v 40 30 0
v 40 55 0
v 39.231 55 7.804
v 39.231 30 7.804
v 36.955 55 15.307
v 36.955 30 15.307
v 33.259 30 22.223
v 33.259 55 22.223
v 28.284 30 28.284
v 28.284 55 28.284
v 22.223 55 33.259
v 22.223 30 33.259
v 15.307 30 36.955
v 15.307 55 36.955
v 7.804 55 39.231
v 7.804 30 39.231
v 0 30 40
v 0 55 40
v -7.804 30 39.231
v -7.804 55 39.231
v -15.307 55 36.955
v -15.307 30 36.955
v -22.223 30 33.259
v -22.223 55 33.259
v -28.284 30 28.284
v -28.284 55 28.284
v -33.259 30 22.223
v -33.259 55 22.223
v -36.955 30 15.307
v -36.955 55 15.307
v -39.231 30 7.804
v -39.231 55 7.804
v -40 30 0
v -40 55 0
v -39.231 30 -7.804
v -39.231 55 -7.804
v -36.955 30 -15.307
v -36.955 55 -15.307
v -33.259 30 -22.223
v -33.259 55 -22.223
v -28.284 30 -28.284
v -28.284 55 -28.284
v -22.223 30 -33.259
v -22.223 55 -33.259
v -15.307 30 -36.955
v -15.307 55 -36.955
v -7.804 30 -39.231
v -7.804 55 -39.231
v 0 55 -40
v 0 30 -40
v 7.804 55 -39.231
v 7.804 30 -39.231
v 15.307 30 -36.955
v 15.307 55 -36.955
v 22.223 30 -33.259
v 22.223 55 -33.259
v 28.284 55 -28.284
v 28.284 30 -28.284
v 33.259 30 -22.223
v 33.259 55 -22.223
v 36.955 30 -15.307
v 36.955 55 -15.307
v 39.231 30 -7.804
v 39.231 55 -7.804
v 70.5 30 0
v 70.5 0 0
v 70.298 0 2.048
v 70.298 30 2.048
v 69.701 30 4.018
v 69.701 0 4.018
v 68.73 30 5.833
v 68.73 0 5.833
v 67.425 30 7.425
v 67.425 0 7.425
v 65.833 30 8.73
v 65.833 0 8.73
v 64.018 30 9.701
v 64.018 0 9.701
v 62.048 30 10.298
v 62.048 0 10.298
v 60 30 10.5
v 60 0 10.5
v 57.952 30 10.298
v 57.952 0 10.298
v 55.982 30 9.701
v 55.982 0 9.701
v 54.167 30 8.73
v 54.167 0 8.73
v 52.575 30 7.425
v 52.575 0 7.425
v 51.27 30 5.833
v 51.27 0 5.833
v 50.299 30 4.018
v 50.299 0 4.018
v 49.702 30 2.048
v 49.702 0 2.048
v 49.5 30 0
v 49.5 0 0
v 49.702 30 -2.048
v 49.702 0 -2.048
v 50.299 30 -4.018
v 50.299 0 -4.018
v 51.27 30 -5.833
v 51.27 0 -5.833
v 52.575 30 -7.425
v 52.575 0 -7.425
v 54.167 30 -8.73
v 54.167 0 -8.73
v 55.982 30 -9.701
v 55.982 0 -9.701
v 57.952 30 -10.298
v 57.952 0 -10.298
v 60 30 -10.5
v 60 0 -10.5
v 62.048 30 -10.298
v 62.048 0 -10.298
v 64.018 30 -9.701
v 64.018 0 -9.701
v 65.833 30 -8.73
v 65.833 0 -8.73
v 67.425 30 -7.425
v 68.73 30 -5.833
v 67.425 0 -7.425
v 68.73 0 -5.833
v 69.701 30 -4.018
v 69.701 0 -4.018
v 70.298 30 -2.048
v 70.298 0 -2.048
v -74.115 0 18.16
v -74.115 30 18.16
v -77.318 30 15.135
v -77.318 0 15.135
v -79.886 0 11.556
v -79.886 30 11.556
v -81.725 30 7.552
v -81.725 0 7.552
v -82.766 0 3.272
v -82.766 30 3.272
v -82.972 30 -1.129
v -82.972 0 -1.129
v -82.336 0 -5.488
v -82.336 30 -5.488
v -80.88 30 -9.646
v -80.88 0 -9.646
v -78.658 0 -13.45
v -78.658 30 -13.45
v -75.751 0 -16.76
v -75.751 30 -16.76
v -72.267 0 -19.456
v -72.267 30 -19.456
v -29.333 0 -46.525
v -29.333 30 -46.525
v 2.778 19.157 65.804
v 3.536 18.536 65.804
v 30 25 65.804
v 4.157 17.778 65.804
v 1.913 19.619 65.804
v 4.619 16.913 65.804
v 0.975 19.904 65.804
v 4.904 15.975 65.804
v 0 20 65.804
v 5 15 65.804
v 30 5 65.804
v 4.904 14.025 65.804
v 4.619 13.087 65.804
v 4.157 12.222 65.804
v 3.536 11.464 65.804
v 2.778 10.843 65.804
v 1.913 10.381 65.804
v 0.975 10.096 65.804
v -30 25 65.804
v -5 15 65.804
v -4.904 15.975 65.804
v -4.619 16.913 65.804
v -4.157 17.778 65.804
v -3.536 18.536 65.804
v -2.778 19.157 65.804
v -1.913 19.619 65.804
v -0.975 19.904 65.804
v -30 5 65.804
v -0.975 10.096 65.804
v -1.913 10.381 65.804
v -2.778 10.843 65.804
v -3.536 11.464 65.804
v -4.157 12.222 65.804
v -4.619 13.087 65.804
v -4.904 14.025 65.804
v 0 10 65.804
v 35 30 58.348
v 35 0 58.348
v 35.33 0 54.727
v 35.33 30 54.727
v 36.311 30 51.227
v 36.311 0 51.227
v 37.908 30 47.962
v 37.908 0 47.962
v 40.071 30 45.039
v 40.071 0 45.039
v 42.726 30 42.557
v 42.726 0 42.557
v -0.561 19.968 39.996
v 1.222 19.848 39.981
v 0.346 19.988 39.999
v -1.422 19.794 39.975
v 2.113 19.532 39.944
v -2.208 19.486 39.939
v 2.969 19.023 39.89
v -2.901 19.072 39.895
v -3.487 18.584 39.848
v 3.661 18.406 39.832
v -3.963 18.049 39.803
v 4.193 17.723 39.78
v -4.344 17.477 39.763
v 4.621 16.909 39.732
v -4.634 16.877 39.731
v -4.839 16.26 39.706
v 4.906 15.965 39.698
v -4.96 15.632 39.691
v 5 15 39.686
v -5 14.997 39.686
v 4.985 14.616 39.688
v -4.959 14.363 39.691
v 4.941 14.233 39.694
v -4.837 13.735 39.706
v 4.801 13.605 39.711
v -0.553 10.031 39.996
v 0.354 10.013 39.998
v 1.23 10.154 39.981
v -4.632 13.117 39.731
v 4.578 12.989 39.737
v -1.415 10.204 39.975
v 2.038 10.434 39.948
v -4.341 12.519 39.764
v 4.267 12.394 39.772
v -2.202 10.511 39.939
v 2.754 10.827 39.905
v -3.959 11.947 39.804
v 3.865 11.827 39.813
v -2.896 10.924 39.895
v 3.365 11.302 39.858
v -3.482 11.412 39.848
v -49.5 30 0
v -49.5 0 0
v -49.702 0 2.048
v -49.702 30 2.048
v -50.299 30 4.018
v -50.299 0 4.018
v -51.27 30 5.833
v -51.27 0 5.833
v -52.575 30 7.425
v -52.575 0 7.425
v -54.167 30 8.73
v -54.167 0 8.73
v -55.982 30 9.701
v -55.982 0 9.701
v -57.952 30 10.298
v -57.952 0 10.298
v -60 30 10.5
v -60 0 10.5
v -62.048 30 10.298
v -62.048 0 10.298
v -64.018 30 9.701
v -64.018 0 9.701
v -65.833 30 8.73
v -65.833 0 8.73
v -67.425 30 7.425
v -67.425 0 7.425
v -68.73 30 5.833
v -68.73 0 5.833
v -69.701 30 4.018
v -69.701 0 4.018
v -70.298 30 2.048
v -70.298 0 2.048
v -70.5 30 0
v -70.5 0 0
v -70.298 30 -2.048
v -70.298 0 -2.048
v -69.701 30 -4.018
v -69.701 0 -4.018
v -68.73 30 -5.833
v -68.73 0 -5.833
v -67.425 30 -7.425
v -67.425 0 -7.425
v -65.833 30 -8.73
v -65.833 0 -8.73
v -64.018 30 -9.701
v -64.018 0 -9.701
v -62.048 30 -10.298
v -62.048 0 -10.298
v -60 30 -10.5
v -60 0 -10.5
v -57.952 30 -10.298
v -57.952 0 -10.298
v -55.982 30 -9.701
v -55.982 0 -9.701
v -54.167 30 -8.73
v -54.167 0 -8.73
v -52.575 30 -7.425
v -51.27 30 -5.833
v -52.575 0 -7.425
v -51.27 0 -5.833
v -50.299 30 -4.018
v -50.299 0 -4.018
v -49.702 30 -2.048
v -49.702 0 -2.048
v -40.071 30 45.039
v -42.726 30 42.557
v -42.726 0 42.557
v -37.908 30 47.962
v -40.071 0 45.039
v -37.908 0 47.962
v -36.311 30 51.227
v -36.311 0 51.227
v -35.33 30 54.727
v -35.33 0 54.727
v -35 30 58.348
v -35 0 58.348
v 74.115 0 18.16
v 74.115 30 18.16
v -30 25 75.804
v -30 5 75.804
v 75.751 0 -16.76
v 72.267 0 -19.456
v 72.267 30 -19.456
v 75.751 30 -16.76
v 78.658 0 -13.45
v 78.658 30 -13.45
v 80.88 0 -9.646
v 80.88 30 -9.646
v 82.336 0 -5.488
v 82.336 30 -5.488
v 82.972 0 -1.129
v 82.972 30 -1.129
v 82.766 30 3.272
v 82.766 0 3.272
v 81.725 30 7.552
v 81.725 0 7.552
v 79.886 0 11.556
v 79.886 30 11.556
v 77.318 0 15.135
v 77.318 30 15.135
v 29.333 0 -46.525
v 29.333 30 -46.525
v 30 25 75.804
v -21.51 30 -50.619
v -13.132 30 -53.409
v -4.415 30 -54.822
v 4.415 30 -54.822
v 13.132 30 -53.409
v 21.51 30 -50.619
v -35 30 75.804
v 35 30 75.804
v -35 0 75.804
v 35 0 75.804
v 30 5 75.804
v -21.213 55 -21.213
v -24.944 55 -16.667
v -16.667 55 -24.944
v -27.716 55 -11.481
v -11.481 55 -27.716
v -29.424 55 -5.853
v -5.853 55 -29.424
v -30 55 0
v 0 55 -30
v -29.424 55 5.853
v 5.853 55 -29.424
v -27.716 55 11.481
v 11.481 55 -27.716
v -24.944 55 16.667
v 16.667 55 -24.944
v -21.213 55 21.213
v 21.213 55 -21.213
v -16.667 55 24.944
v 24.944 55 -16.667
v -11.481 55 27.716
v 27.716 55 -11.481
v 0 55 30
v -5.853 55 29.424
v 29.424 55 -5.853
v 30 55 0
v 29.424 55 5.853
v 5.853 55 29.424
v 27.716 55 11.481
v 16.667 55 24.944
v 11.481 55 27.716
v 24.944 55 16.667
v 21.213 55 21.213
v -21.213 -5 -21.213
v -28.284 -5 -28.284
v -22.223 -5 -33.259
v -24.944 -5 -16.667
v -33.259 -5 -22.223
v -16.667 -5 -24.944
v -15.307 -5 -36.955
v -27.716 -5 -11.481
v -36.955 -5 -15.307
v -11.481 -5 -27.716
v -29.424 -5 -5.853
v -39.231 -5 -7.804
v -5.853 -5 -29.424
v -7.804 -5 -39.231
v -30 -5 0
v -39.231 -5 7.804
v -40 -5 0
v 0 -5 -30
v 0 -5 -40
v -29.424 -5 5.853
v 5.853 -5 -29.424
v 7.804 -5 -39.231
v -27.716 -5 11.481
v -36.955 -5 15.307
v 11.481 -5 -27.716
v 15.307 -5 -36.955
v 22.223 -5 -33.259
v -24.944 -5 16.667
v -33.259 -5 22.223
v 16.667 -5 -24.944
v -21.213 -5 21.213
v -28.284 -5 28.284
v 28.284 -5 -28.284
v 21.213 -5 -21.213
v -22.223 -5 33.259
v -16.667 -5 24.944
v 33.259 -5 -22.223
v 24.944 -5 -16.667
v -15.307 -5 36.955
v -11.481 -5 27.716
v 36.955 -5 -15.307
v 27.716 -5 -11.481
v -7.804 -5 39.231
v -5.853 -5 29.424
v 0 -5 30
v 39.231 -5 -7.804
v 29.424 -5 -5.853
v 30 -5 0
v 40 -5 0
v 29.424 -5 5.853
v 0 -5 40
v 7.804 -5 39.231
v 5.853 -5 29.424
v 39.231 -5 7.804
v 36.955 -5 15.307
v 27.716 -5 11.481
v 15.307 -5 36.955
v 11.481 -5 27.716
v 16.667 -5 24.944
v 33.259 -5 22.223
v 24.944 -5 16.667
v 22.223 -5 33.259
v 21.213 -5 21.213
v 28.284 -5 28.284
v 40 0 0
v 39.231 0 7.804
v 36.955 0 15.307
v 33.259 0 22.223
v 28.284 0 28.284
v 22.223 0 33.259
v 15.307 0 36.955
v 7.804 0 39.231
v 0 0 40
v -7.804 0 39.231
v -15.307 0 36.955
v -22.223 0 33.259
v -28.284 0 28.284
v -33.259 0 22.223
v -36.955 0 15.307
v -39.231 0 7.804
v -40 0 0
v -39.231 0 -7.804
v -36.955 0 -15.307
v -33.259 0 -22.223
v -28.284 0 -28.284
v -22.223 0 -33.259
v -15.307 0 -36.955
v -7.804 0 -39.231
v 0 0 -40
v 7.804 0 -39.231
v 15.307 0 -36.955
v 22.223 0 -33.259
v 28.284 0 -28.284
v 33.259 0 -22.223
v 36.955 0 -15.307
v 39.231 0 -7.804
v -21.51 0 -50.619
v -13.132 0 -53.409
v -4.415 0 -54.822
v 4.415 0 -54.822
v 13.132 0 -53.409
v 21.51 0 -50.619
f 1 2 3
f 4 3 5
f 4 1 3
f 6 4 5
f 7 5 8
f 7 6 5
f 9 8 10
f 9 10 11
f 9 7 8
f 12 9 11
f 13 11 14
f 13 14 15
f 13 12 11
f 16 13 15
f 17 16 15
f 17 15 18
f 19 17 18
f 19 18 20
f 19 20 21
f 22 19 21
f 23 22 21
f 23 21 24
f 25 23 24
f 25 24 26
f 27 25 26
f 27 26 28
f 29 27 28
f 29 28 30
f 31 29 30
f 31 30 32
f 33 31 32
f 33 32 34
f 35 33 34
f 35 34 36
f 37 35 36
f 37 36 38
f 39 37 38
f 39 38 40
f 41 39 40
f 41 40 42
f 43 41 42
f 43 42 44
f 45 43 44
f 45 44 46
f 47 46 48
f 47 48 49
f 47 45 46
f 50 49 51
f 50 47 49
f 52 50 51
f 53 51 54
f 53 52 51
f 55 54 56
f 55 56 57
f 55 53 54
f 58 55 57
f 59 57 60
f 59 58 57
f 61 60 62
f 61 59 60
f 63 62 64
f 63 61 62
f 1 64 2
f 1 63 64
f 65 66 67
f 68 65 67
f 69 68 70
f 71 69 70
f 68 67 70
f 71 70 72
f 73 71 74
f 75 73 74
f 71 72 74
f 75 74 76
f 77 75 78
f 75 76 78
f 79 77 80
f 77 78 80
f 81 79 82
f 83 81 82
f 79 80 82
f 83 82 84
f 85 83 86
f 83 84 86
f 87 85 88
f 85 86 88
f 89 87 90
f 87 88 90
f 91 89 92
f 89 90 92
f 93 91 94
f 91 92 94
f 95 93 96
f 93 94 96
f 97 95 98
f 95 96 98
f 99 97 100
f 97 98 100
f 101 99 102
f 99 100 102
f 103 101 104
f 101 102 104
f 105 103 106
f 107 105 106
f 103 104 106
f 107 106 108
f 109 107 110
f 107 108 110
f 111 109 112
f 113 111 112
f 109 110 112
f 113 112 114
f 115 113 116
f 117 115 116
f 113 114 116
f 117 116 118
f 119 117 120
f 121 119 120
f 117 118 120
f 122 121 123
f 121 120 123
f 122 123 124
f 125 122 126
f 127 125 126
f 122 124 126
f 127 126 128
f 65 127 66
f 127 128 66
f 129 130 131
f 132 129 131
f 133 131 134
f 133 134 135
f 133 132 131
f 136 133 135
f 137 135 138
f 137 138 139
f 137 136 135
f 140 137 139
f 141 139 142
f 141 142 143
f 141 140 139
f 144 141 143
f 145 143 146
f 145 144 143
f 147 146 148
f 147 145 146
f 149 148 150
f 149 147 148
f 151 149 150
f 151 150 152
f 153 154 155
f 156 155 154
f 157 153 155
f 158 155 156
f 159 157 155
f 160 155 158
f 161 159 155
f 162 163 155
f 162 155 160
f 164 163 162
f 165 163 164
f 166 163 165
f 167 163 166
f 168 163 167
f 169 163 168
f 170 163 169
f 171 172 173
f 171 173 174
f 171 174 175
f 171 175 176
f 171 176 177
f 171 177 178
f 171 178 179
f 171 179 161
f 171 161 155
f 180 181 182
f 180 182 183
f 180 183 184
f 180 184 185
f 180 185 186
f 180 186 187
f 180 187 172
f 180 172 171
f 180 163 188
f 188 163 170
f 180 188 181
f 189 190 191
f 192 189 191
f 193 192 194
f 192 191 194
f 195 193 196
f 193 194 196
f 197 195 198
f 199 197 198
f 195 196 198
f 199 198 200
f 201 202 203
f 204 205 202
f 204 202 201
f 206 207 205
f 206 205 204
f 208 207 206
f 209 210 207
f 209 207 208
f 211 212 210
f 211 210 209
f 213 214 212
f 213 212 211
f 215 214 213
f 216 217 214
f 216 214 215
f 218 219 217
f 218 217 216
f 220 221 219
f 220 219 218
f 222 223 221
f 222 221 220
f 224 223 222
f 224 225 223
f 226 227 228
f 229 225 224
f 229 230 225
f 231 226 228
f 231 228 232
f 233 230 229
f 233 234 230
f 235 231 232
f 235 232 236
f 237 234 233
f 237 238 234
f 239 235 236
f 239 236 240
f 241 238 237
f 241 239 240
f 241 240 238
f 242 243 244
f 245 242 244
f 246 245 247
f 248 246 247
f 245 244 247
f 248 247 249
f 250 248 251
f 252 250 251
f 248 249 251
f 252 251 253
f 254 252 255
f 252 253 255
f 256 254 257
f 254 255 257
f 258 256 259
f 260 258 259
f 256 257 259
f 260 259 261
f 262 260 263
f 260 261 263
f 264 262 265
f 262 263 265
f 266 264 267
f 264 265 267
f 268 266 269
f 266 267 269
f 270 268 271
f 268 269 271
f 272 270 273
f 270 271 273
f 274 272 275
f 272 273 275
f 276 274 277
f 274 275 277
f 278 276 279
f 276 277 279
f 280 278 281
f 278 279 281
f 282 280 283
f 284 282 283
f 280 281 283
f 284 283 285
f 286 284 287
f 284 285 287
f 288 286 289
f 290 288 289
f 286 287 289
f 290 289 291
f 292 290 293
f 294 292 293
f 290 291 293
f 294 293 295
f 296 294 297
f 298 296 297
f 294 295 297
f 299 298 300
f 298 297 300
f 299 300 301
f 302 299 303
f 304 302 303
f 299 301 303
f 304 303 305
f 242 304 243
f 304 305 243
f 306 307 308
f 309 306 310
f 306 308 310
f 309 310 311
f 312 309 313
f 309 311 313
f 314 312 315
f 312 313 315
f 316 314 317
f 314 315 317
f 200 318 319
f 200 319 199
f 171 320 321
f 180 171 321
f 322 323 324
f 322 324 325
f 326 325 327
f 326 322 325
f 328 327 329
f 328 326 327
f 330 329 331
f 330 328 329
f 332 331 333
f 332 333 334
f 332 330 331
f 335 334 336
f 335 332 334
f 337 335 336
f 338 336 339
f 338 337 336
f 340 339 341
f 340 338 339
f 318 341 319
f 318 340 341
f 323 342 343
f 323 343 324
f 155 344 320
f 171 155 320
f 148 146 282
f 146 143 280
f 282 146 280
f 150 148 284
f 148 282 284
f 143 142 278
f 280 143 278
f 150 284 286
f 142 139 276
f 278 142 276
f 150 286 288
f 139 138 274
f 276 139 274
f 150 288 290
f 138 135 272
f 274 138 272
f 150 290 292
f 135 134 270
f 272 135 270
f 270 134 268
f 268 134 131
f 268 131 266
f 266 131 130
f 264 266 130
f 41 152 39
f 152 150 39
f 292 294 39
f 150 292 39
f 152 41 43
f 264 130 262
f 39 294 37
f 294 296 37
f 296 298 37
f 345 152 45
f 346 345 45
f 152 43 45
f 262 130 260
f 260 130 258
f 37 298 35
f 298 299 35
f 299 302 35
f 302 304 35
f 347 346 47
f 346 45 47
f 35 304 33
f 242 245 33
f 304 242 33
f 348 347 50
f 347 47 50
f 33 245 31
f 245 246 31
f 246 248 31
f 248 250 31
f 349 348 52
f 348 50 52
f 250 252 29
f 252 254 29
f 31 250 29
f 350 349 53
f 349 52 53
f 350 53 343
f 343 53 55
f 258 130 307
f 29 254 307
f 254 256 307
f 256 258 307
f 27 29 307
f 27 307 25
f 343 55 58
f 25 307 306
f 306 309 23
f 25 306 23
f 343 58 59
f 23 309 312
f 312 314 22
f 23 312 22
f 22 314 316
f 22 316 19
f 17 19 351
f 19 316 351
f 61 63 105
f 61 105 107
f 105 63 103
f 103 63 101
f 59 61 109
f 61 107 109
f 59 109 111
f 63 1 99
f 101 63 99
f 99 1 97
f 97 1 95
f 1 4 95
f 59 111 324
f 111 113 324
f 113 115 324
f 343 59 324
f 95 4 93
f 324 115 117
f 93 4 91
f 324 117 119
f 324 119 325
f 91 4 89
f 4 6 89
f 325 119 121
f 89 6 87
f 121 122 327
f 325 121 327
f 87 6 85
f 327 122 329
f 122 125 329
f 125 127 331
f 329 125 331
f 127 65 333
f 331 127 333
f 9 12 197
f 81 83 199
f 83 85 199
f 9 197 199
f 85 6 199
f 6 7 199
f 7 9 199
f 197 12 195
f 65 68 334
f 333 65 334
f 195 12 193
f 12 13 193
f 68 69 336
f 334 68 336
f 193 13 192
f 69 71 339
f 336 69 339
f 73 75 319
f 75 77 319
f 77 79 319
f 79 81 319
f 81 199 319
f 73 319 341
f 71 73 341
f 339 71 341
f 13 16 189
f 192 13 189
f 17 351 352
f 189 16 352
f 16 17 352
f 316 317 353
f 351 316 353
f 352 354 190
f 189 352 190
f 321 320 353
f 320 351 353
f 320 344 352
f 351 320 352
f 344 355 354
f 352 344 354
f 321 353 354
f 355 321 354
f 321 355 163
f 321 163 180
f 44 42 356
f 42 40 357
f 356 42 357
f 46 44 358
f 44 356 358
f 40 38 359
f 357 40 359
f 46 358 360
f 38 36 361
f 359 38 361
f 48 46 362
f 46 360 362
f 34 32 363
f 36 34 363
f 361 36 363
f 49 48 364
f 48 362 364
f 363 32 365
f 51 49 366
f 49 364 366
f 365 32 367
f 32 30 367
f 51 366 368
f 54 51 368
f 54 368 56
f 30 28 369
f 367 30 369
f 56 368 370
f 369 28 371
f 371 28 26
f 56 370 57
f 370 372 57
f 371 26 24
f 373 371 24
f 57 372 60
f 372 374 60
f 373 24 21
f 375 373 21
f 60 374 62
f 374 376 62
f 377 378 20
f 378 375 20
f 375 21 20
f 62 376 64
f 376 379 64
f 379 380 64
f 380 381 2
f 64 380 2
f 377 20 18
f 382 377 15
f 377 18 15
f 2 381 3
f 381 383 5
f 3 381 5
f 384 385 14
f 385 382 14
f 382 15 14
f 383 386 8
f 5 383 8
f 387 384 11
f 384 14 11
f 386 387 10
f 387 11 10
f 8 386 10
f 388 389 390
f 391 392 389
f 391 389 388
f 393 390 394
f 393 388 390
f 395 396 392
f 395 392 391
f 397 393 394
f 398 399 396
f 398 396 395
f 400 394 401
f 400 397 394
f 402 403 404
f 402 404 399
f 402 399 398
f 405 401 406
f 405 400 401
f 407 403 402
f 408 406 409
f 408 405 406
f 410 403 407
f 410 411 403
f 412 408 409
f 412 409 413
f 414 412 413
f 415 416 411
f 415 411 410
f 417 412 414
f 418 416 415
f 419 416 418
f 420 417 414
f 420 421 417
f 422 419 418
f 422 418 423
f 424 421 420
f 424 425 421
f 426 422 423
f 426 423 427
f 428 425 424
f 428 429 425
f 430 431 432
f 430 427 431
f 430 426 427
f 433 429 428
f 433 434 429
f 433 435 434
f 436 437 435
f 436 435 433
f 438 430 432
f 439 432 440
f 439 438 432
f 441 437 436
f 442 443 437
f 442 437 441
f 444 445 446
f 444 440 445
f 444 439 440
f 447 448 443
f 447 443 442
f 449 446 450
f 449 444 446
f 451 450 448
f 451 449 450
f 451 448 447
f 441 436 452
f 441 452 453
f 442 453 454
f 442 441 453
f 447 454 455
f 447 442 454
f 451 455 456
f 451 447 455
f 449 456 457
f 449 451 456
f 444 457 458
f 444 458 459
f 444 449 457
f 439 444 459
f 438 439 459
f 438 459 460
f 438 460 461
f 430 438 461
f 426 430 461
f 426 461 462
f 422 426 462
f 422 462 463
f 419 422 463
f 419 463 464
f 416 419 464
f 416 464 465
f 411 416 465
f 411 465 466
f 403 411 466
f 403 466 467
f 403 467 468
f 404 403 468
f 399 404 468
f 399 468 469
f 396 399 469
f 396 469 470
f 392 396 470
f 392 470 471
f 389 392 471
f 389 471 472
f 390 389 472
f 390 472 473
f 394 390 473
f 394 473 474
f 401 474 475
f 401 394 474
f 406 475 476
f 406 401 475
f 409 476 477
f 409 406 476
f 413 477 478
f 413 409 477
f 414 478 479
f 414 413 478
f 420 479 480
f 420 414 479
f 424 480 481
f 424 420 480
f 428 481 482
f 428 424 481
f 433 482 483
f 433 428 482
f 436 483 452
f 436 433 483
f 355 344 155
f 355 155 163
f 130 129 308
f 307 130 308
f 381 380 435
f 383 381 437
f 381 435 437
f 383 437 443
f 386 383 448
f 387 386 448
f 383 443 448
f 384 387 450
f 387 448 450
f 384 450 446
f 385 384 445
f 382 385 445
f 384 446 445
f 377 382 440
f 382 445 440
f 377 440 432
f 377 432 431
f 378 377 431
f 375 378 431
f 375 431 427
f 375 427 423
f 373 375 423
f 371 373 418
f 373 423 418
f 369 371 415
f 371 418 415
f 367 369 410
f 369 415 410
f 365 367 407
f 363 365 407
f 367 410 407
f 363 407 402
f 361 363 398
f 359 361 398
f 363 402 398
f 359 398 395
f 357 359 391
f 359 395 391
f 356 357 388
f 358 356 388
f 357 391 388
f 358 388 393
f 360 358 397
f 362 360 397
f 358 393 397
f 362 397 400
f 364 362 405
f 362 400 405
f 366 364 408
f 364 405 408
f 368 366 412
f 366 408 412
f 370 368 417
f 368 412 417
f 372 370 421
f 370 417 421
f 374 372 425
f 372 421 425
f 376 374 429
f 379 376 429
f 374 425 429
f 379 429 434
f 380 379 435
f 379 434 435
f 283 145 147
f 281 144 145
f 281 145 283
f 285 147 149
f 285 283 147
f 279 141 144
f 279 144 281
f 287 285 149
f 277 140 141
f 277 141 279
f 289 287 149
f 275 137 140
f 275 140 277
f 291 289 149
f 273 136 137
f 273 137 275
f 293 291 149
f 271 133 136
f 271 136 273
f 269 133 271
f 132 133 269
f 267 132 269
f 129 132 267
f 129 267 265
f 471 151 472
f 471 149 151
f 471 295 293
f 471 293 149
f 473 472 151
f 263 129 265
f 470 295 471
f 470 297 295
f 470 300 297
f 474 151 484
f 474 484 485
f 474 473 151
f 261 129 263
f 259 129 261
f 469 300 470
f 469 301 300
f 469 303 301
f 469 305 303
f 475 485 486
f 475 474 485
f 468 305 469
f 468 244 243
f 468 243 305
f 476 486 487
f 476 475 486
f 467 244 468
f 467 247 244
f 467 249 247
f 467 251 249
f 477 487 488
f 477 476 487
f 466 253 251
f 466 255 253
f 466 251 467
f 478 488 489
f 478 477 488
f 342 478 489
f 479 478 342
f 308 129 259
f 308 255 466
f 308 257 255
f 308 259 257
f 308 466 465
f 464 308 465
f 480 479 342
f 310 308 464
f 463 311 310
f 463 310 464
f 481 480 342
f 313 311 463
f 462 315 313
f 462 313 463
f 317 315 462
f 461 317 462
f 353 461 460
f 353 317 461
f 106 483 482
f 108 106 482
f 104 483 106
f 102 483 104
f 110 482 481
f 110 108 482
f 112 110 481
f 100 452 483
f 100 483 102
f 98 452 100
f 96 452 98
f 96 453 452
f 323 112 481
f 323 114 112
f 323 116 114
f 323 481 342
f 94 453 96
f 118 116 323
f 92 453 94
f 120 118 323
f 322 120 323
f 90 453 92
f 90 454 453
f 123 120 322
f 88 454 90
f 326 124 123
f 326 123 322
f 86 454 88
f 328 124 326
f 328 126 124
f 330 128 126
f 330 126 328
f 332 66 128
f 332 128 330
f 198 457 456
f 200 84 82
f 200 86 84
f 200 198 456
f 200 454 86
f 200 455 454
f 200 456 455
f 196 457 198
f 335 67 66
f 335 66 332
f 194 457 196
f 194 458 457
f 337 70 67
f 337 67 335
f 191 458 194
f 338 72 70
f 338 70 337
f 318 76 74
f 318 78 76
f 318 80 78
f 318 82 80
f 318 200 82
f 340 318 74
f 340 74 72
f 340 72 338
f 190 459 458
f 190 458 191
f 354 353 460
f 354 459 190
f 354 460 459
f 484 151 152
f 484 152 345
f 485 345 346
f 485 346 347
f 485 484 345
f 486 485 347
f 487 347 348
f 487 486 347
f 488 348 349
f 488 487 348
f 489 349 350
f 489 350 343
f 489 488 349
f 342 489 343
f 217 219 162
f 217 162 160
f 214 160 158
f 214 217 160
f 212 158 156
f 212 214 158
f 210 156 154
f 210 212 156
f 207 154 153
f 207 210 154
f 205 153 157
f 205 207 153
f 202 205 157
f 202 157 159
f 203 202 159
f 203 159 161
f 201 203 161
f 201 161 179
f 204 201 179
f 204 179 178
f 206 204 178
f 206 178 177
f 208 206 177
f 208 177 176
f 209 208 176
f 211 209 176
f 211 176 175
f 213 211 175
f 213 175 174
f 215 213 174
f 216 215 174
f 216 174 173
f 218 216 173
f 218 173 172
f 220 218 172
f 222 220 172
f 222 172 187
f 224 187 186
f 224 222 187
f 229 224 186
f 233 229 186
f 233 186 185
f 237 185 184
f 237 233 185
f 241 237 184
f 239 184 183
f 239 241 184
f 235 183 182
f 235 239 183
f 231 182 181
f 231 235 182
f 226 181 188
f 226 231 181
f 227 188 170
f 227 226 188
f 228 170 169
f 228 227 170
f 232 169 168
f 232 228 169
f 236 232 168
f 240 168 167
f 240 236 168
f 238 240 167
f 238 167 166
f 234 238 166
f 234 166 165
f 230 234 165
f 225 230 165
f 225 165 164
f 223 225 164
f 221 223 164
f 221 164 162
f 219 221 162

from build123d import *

# Parameters (mm, degrees)
SKETCH_R        = 40
SKETCH_R_2      = 10.5
PAD_DEPTH       = 30
SKETCH001_R     = 5
POCKET_DEPTH    = 75.804681
SKETCH002_W     = 60
SKETCH002_H     = 20
POCKET001_DEPTH = 10
SKETCH003_R     = 40
SKETCH003_R_2   = 30
PAD001_DEPTH    = 60


with BuildPart() as part:
    # Sketch → Pad (new body)
    with BuildSketch(Plane.XZ):
        with BuildLine():
            ThreePointArc((-29.333333, -46.524784), (0, -55), (29.333333, -46.524784))
            Line((29.333333, -46.524784), (72.266667, -19.455819))
            ThreePointArc((72.266667, -19.455819), (82.97229, -1.128676), (74.114792, 18.159644))
            Line((74.114792, 18.159644), (42.726268, 42.556734))
            ThreePointArc((35, 58.347728), (37.035109, 49.557809), (42.726268, 42.556734))
            Line((35, 75.803681), (35, 58.347728))
            Line((-35, 75.803681), (35, 75.803681))
            Line((-35, 58.347728), (-35, 75.803681))
            ThreePointArc((-42.726268, 42.556734), (-37.035109, 49.557809), (-35, 58.347728))
            Line((-74.114792, 18.159644), (-42.726268, 42.556734))
            ThreePointArc((-74.114792, 18.159644), (-82.97229, -1.128676), (-72.266667, -19.455819))
            Line((-72.266667, -19.455819), (-29.333333, -46.524784))
        make_face()
        Circle(SKETCH_R, mode=Mode.SUBTRACT)
        with Locations((-60, 0)):
            Circle(SKETCH_R_2, mode=Mode.SUBTRACT)
        with Locations((60, 0)):
            Circle(SKETCH_R_2, mode=Mode.SUBTRACT)
    extrude(amount=-PAD_DEPTH)

    # Sketch001 → Pocket (cut, through all)
    with BuildSketch(Plane.XY):
        with Locations((0, 15)):
            Circle(SKETCH001_R)
    extrude(amount=POCKET_DEPTH, mode=Mode.SUBTRACT)

    # Sketch002 (on Face13 of Pocket) → Pocket001 (cut)
    with BuildSketch(Plane(origin=(0, 0, 75.803681), x_dir=(-1, 0, 0), z_dir=(0, 0, 1))):
        with Locations((0, -15)):
            Rectangle(SKETCH002_W, SKETCH002_H)
    extrude(amount=-POCKET001_DEPTH, mode=Mode.SUBTRACT)

    # Sketch003 (on DatumPlane) → Pad001 (join)
    with BuildSketch(Plane.XZ.offset(5)):
        Circle(SKETCH003_R)
        Circle(SKETCH003_R_2, mode=Mode.SUBTRACT)
    extrude(amount=-PAD001_DEPTH)


solid = part.part
